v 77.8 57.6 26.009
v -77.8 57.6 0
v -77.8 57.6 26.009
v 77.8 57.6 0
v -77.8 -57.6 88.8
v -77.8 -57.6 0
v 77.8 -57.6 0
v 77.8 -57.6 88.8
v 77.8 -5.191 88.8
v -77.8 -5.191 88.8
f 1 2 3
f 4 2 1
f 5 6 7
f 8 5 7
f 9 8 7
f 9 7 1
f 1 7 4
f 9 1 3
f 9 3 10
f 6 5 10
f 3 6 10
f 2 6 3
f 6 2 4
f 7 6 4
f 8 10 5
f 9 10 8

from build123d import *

# Parameters (mm, degrees)
SKIZZE1_W                       = 155.6
SKIZZE1_H                       = 115.2
AUFSATZ_LINEAR_AUSTRAGEN1_DEPTH = 88.8
SCHNITT_LINEAR_AUSTRAGEN1_DEPTH = 189.187566008


with BuildPart() as part:
    # Skizze1 → Aufsatz-Linear austragen1 (new body)
    with BuildSketch(Plane.XY):
        Rectangle(SKIZZE1_W, SKIZZE1_H)
    extrude(amount=AUFSATZ_LINEAR_AUSTRAGEN1_DEPTH)

    # Skizze6 → Schnitt-Linear austragen1 (cut, through all)
    with BuildSketch(Plane.ZY.offset(77.8)):
        Polygon((26.008917831, 57.6), (88.8, -5.191082169), (88.8, 57.6), align=None)
    extrude(amount=-SCHNITT_LINEAR_AUSTRAGEN1_DEPTH, mode=Mode.SUBTRACT)


solid = part.part
